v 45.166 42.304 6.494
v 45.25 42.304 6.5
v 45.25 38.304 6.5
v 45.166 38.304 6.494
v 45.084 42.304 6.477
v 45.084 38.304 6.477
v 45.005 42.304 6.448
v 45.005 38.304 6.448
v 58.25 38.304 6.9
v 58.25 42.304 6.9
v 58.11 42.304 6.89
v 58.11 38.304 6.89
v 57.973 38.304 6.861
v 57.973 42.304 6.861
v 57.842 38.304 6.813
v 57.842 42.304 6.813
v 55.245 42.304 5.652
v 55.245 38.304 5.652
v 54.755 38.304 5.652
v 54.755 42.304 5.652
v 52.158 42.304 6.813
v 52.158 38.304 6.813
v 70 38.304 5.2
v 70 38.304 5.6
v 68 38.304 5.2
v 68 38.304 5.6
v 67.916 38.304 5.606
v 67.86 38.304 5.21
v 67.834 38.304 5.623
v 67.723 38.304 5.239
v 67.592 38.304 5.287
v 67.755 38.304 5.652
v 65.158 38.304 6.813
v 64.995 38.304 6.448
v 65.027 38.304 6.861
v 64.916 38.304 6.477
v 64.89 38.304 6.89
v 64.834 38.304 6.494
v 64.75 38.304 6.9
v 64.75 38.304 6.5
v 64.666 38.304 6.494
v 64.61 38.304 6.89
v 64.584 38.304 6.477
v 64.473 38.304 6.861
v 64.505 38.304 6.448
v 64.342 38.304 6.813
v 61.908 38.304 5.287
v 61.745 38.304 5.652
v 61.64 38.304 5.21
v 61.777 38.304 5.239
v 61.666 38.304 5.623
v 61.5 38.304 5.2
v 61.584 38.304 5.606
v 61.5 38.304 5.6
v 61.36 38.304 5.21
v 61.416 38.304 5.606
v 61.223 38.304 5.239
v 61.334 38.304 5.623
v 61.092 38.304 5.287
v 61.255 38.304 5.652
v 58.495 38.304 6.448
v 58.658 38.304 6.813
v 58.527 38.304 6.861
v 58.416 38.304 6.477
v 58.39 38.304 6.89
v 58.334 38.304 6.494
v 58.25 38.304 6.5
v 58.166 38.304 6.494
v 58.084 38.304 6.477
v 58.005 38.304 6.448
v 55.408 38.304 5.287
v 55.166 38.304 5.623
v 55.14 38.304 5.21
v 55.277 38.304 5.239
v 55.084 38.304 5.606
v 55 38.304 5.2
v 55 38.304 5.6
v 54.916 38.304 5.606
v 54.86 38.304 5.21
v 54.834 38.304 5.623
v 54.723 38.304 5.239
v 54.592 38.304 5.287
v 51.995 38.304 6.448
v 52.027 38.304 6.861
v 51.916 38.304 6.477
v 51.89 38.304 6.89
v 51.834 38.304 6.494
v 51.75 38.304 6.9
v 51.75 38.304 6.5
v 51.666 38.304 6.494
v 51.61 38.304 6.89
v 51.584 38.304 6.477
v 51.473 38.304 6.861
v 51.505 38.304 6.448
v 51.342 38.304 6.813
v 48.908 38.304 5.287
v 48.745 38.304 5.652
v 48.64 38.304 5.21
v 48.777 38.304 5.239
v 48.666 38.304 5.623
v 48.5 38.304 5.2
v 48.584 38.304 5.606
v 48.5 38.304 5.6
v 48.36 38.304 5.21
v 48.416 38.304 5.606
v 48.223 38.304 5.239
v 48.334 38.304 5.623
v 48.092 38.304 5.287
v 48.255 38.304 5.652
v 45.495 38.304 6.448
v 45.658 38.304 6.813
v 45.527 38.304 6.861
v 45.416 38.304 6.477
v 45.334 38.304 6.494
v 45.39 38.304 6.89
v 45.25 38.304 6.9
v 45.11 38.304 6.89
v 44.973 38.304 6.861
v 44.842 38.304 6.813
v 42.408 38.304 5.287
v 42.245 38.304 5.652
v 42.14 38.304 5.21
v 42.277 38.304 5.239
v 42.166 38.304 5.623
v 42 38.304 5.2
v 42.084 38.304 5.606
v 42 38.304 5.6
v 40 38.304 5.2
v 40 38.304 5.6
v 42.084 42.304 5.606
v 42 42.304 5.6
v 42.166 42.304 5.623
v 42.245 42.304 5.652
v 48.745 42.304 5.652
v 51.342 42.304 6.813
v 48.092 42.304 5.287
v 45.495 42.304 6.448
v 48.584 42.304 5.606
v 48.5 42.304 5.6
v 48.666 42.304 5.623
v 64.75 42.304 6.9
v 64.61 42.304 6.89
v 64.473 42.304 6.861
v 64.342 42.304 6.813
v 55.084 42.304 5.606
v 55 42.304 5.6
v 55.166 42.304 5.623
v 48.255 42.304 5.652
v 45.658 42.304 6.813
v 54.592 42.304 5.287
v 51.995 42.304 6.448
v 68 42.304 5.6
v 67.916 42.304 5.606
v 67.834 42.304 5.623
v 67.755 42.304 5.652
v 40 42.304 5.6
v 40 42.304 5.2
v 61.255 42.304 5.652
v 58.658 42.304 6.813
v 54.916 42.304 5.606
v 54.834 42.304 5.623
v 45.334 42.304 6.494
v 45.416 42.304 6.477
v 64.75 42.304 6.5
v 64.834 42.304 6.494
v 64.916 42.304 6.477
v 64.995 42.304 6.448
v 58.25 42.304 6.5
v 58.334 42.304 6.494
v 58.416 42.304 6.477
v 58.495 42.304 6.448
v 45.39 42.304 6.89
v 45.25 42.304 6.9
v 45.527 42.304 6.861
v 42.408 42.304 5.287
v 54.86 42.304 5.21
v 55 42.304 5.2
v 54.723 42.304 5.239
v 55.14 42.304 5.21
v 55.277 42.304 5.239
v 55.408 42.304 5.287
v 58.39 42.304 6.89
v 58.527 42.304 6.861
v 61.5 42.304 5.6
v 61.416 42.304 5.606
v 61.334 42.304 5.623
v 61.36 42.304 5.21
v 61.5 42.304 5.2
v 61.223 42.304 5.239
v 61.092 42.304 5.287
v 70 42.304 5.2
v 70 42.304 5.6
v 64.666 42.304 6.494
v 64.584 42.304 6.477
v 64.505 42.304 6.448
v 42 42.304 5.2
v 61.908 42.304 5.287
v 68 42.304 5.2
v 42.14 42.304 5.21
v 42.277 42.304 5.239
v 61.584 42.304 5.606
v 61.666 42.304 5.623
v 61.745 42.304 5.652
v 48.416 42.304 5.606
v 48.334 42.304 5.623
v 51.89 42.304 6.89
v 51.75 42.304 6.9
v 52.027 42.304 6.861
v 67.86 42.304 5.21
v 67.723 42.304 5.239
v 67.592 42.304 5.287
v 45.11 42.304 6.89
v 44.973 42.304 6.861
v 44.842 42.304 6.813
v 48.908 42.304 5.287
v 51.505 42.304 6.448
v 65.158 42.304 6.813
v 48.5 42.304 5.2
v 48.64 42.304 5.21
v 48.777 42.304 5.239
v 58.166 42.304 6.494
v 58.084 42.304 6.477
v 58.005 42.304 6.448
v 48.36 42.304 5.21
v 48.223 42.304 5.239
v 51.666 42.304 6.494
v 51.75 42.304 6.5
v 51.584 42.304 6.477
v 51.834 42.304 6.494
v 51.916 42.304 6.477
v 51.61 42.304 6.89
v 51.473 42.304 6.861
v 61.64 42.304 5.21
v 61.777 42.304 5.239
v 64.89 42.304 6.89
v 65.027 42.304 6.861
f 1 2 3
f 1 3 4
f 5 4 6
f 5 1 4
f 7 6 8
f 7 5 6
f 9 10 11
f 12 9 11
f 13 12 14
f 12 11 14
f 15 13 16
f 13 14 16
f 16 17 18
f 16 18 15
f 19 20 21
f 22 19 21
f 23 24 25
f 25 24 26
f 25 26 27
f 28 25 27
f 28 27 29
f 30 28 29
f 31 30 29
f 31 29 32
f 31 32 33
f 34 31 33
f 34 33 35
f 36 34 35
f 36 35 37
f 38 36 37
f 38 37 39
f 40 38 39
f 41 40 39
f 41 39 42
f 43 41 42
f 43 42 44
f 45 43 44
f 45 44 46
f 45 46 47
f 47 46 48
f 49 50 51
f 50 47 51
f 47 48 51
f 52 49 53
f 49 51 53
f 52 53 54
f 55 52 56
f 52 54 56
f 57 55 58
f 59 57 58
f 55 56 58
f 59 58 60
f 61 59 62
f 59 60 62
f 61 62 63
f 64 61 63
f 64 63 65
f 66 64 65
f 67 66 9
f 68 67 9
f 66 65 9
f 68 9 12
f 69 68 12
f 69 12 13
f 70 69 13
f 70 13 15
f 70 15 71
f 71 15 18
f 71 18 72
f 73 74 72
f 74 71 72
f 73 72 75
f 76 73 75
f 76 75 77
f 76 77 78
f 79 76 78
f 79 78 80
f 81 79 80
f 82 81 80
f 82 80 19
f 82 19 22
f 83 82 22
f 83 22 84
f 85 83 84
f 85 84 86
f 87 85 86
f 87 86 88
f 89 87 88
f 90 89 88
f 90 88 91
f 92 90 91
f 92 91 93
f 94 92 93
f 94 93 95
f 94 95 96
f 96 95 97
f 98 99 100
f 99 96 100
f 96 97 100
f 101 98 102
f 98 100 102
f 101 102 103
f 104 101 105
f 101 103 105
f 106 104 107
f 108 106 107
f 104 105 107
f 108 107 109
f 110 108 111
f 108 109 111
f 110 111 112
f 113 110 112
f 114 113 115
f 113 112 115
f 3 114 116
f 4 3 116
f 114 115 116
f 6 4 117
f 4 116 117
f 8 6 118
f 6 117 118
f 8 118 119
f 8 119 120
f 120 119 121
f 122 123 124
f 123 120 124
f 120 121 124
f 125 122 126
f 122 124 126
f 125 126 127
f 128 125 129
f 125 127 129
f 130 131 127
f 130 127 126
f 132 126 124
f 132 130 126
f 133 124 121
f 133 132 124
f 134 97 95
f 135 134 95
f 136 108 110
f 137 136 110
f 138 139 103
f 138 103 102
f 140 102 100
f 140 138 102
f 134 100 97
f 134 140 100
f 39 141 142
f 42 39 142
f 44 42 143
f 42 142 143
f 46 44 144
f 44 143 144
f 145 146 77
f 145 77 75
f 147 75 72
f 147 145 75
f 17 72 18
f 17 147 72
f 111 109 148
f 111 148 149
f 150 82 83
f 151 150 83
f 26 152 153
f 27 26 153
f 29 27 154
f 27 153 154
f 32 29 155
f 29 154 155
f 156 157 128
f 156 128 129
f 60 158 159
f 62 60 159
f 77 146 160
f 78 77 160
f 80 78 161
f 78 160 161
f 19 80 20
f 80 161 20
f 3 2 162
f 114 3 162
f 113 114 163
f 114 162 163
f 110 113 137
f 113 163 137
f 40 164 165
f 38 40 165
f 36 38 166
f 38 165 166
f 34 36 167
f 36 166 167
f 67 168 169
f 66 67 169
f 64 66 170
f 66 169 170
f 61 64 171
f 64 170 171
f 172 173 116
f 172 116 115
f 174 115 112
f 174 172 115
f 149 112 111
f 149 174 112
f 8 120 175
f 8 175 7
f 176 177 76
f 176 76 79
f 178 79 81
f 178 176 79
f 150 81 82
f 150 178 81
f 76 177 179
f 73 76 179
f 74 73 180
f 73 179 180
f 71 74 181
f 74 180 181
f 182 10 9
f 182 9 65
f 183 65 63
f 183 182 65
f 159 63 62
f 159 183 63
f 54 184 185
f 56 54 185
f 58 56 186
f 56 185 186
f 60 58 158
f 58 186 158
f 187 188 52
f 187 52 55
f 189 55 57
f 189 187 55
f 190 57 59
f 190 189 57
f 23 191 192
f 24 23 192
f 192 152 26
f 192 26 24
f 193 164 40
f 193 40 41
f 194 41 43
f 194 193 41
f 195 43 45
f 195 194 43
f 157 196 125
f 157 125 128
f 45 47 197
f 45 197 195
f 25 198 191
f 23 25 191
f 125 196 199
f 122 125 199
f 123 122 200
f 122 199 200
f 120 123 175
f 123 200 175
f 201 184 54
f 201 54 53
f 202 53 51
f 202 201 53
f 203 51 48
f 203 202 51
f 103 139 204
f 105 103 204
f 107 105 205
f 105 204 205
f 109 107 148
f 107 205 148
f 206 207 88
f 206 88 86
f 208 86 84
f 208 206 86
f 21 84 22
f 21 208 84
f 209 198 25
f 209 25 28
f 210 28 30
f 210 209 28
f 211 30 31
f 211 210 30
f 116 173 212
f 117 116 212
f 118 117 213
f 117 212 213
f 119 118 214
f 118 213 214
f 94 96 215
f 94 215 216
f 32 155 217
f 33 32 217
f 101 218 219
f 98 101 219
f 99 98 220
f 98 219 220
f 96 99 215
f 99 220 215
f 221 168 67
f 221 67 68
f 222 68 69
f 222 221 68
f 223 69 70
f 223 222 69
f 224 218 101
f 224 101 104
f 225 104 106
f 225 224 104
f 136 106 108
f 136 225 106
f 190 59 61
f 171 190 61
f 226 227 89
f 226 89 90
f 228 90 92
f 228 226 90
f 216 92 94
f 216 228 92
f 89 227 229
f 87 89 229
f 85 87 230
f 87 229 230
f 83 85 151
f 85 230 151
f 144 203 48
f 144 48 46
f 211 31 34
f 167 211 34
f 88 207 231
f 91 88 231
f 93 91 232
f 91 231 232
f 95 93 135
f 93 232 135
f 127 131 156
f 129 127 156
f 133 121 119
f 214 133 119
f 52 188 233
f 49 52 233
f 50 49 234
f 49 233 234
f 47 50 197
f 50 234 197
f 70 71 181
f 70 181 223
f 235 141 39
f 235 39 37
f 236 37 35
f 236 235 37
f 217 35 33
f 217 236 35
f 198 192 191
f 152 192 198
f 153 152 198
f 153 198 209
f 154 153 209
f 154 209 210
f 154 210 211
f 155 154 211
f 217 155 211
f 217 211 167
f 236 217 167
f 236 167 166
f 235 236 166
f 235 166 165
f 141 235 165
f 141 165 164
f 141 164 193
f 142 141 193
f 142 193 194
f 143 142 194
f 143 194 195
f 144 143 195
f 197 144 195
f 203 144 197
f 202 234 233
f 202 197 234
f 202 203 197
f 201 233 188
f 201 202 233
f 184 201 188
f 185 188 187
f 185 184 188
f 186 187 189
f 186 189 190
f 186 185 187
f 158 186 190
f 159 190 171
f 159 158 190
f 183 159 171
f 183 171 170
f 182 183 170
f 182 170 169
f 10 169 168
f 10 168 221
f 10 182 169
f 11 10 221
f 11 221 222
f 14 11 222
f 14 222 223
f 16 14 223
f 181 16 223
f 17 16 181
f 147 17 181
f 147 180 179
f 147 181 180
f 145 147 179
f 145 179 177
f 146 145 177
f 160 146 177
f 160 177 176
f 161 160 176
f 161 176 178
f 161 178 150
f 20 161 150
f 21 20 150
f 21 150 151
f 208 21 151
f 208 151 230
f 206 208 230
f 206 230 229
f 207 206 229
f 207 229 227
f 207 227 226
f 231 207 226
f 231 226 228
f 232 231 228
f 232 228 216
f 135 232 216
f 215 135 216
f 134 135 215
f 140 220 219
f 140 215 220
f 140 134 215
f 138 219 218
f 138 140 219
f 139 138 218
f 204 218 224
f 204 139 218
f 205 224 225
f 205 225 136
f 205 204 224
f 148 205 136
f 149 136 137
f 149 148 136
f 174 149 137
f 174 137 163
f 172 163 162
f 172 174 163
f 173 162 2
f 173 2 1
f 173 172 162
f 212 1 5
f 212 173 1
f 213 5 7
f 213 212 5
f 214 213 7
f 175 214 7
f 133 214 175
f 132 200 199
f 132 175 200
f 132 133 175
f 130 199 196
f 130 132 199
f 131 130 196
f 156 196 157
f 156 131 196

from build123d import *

# Parameters (mm, degrees)
PAD011_DEPTH               = 4
PAD011_MIRRORED008_2_DEPTH = 4
LINEARPATTERN004_COUNT     = 2
LINEARPATTERN004_PITCH     = 6.5
SKETCH041_W                = 2
SKETCH041_H                = 0.4
PAD022_DEPTH               = 4


with BuildPart() as part:
    # Sketch024 (on DatumPlane) → Pad011 (new body)
    with BuildSketch(Plane(origin=(55, 42.304, 0), x_dir=(1, 0, 0), z_dir=(0, -1, 0))):
        with BuildLine():
            Line((0, 5.2), (0, 5.6))
            ThreePointArc((0, 5.6), (0.125164, 5.6132), (0.24482, 5.65222))
            Line((0.24482, 5.65222), (2.841966, 6.812967))
            ThreePointArc((3.25, 6.9), (3.041394, 6.878), (2.841966, 6.812967))
            Line((3.25, 6.5), (3.25, 6.9))
            ThreePointArc((3.25, 6.5), (3.124841, 6.486801), (3.005188, 6.447784))
            Line((0.408034, 5.287033), (3.005188, 6.447784))
            ThreePointArc((0, 5.2), (0.208606, 5.222), (0.408034, 5.287033))
        make_face()
    pad011 = extrude(amount=PAD011_DEPTH)

    # Sketch024 Mirrored008 2 → Pad011 Mirrored008 2 (add)
    with BuildSketch(Plane(origin=(61.5, 42.304, 0), x_dir=(-1, 0, 0), z_dir=(0, 1, 0))):
        with BuildLine():
            Line((0, 5.2), (0, 5.6))
            ThreePointArc((0, 5.6), (0.125164, 5.6132), (0.24482, 5.65222))
            Line((0.24482, 5.65222), (2.841966, 6.812967))
            ThreePointArc((3.25, 6.9), (3.041394, 6.878), (2.841966, 6.812967))
            Line((3.25, 6.5), (3.25, 6.9))
            ThreePointArc((3.25, 6.5), (3.124841, 6.486801), (3.005188, 6.447784))
            Line((0.408034, 5.287033), (3.005188, 6.447784))
            ThreePointArc((0, 5.2), (0.208606, 5.222), (0.408034, 5.287033))
        make_face()
    pad011_mirrored008_2 = extrude(amount=-PAD011_MIRRORED008_2_DEPTH)

    # LinearPattern004: Pad011, Pad011 Mirrored008 2 ×2
    with Locations(*[(i * LINEARPATTERN004_PITCH, 0, 0) for i in range(1, LINEARPATTERN004_COUNT)]):
        add(pad011)
        add(pad011_mirrored008_2)

    # Sketch041 (on DatumPlane) → Pad022 (join)
    with BuildSketch(Plane(origin=(55, 42.304, 0), x_dir=(1, 0, 0), z_dir=(0, -1, 0))):
        with Locations((14, 5.4)):
            Rectangle(SKETCH041_W, SKETCH041_H)
    extrude(amount=PAD022_DEPTH)

    # Mirrored009: part across Sketch041 V_Axis


with BuildPart() as part_1:
    add(part.part)
    add(part.part.mirror(Plane(origin=(55, 42.304, 0), x_dir=(0, -1, 0), z_dir=(1, 0, 0))))


solid = part_1.part
